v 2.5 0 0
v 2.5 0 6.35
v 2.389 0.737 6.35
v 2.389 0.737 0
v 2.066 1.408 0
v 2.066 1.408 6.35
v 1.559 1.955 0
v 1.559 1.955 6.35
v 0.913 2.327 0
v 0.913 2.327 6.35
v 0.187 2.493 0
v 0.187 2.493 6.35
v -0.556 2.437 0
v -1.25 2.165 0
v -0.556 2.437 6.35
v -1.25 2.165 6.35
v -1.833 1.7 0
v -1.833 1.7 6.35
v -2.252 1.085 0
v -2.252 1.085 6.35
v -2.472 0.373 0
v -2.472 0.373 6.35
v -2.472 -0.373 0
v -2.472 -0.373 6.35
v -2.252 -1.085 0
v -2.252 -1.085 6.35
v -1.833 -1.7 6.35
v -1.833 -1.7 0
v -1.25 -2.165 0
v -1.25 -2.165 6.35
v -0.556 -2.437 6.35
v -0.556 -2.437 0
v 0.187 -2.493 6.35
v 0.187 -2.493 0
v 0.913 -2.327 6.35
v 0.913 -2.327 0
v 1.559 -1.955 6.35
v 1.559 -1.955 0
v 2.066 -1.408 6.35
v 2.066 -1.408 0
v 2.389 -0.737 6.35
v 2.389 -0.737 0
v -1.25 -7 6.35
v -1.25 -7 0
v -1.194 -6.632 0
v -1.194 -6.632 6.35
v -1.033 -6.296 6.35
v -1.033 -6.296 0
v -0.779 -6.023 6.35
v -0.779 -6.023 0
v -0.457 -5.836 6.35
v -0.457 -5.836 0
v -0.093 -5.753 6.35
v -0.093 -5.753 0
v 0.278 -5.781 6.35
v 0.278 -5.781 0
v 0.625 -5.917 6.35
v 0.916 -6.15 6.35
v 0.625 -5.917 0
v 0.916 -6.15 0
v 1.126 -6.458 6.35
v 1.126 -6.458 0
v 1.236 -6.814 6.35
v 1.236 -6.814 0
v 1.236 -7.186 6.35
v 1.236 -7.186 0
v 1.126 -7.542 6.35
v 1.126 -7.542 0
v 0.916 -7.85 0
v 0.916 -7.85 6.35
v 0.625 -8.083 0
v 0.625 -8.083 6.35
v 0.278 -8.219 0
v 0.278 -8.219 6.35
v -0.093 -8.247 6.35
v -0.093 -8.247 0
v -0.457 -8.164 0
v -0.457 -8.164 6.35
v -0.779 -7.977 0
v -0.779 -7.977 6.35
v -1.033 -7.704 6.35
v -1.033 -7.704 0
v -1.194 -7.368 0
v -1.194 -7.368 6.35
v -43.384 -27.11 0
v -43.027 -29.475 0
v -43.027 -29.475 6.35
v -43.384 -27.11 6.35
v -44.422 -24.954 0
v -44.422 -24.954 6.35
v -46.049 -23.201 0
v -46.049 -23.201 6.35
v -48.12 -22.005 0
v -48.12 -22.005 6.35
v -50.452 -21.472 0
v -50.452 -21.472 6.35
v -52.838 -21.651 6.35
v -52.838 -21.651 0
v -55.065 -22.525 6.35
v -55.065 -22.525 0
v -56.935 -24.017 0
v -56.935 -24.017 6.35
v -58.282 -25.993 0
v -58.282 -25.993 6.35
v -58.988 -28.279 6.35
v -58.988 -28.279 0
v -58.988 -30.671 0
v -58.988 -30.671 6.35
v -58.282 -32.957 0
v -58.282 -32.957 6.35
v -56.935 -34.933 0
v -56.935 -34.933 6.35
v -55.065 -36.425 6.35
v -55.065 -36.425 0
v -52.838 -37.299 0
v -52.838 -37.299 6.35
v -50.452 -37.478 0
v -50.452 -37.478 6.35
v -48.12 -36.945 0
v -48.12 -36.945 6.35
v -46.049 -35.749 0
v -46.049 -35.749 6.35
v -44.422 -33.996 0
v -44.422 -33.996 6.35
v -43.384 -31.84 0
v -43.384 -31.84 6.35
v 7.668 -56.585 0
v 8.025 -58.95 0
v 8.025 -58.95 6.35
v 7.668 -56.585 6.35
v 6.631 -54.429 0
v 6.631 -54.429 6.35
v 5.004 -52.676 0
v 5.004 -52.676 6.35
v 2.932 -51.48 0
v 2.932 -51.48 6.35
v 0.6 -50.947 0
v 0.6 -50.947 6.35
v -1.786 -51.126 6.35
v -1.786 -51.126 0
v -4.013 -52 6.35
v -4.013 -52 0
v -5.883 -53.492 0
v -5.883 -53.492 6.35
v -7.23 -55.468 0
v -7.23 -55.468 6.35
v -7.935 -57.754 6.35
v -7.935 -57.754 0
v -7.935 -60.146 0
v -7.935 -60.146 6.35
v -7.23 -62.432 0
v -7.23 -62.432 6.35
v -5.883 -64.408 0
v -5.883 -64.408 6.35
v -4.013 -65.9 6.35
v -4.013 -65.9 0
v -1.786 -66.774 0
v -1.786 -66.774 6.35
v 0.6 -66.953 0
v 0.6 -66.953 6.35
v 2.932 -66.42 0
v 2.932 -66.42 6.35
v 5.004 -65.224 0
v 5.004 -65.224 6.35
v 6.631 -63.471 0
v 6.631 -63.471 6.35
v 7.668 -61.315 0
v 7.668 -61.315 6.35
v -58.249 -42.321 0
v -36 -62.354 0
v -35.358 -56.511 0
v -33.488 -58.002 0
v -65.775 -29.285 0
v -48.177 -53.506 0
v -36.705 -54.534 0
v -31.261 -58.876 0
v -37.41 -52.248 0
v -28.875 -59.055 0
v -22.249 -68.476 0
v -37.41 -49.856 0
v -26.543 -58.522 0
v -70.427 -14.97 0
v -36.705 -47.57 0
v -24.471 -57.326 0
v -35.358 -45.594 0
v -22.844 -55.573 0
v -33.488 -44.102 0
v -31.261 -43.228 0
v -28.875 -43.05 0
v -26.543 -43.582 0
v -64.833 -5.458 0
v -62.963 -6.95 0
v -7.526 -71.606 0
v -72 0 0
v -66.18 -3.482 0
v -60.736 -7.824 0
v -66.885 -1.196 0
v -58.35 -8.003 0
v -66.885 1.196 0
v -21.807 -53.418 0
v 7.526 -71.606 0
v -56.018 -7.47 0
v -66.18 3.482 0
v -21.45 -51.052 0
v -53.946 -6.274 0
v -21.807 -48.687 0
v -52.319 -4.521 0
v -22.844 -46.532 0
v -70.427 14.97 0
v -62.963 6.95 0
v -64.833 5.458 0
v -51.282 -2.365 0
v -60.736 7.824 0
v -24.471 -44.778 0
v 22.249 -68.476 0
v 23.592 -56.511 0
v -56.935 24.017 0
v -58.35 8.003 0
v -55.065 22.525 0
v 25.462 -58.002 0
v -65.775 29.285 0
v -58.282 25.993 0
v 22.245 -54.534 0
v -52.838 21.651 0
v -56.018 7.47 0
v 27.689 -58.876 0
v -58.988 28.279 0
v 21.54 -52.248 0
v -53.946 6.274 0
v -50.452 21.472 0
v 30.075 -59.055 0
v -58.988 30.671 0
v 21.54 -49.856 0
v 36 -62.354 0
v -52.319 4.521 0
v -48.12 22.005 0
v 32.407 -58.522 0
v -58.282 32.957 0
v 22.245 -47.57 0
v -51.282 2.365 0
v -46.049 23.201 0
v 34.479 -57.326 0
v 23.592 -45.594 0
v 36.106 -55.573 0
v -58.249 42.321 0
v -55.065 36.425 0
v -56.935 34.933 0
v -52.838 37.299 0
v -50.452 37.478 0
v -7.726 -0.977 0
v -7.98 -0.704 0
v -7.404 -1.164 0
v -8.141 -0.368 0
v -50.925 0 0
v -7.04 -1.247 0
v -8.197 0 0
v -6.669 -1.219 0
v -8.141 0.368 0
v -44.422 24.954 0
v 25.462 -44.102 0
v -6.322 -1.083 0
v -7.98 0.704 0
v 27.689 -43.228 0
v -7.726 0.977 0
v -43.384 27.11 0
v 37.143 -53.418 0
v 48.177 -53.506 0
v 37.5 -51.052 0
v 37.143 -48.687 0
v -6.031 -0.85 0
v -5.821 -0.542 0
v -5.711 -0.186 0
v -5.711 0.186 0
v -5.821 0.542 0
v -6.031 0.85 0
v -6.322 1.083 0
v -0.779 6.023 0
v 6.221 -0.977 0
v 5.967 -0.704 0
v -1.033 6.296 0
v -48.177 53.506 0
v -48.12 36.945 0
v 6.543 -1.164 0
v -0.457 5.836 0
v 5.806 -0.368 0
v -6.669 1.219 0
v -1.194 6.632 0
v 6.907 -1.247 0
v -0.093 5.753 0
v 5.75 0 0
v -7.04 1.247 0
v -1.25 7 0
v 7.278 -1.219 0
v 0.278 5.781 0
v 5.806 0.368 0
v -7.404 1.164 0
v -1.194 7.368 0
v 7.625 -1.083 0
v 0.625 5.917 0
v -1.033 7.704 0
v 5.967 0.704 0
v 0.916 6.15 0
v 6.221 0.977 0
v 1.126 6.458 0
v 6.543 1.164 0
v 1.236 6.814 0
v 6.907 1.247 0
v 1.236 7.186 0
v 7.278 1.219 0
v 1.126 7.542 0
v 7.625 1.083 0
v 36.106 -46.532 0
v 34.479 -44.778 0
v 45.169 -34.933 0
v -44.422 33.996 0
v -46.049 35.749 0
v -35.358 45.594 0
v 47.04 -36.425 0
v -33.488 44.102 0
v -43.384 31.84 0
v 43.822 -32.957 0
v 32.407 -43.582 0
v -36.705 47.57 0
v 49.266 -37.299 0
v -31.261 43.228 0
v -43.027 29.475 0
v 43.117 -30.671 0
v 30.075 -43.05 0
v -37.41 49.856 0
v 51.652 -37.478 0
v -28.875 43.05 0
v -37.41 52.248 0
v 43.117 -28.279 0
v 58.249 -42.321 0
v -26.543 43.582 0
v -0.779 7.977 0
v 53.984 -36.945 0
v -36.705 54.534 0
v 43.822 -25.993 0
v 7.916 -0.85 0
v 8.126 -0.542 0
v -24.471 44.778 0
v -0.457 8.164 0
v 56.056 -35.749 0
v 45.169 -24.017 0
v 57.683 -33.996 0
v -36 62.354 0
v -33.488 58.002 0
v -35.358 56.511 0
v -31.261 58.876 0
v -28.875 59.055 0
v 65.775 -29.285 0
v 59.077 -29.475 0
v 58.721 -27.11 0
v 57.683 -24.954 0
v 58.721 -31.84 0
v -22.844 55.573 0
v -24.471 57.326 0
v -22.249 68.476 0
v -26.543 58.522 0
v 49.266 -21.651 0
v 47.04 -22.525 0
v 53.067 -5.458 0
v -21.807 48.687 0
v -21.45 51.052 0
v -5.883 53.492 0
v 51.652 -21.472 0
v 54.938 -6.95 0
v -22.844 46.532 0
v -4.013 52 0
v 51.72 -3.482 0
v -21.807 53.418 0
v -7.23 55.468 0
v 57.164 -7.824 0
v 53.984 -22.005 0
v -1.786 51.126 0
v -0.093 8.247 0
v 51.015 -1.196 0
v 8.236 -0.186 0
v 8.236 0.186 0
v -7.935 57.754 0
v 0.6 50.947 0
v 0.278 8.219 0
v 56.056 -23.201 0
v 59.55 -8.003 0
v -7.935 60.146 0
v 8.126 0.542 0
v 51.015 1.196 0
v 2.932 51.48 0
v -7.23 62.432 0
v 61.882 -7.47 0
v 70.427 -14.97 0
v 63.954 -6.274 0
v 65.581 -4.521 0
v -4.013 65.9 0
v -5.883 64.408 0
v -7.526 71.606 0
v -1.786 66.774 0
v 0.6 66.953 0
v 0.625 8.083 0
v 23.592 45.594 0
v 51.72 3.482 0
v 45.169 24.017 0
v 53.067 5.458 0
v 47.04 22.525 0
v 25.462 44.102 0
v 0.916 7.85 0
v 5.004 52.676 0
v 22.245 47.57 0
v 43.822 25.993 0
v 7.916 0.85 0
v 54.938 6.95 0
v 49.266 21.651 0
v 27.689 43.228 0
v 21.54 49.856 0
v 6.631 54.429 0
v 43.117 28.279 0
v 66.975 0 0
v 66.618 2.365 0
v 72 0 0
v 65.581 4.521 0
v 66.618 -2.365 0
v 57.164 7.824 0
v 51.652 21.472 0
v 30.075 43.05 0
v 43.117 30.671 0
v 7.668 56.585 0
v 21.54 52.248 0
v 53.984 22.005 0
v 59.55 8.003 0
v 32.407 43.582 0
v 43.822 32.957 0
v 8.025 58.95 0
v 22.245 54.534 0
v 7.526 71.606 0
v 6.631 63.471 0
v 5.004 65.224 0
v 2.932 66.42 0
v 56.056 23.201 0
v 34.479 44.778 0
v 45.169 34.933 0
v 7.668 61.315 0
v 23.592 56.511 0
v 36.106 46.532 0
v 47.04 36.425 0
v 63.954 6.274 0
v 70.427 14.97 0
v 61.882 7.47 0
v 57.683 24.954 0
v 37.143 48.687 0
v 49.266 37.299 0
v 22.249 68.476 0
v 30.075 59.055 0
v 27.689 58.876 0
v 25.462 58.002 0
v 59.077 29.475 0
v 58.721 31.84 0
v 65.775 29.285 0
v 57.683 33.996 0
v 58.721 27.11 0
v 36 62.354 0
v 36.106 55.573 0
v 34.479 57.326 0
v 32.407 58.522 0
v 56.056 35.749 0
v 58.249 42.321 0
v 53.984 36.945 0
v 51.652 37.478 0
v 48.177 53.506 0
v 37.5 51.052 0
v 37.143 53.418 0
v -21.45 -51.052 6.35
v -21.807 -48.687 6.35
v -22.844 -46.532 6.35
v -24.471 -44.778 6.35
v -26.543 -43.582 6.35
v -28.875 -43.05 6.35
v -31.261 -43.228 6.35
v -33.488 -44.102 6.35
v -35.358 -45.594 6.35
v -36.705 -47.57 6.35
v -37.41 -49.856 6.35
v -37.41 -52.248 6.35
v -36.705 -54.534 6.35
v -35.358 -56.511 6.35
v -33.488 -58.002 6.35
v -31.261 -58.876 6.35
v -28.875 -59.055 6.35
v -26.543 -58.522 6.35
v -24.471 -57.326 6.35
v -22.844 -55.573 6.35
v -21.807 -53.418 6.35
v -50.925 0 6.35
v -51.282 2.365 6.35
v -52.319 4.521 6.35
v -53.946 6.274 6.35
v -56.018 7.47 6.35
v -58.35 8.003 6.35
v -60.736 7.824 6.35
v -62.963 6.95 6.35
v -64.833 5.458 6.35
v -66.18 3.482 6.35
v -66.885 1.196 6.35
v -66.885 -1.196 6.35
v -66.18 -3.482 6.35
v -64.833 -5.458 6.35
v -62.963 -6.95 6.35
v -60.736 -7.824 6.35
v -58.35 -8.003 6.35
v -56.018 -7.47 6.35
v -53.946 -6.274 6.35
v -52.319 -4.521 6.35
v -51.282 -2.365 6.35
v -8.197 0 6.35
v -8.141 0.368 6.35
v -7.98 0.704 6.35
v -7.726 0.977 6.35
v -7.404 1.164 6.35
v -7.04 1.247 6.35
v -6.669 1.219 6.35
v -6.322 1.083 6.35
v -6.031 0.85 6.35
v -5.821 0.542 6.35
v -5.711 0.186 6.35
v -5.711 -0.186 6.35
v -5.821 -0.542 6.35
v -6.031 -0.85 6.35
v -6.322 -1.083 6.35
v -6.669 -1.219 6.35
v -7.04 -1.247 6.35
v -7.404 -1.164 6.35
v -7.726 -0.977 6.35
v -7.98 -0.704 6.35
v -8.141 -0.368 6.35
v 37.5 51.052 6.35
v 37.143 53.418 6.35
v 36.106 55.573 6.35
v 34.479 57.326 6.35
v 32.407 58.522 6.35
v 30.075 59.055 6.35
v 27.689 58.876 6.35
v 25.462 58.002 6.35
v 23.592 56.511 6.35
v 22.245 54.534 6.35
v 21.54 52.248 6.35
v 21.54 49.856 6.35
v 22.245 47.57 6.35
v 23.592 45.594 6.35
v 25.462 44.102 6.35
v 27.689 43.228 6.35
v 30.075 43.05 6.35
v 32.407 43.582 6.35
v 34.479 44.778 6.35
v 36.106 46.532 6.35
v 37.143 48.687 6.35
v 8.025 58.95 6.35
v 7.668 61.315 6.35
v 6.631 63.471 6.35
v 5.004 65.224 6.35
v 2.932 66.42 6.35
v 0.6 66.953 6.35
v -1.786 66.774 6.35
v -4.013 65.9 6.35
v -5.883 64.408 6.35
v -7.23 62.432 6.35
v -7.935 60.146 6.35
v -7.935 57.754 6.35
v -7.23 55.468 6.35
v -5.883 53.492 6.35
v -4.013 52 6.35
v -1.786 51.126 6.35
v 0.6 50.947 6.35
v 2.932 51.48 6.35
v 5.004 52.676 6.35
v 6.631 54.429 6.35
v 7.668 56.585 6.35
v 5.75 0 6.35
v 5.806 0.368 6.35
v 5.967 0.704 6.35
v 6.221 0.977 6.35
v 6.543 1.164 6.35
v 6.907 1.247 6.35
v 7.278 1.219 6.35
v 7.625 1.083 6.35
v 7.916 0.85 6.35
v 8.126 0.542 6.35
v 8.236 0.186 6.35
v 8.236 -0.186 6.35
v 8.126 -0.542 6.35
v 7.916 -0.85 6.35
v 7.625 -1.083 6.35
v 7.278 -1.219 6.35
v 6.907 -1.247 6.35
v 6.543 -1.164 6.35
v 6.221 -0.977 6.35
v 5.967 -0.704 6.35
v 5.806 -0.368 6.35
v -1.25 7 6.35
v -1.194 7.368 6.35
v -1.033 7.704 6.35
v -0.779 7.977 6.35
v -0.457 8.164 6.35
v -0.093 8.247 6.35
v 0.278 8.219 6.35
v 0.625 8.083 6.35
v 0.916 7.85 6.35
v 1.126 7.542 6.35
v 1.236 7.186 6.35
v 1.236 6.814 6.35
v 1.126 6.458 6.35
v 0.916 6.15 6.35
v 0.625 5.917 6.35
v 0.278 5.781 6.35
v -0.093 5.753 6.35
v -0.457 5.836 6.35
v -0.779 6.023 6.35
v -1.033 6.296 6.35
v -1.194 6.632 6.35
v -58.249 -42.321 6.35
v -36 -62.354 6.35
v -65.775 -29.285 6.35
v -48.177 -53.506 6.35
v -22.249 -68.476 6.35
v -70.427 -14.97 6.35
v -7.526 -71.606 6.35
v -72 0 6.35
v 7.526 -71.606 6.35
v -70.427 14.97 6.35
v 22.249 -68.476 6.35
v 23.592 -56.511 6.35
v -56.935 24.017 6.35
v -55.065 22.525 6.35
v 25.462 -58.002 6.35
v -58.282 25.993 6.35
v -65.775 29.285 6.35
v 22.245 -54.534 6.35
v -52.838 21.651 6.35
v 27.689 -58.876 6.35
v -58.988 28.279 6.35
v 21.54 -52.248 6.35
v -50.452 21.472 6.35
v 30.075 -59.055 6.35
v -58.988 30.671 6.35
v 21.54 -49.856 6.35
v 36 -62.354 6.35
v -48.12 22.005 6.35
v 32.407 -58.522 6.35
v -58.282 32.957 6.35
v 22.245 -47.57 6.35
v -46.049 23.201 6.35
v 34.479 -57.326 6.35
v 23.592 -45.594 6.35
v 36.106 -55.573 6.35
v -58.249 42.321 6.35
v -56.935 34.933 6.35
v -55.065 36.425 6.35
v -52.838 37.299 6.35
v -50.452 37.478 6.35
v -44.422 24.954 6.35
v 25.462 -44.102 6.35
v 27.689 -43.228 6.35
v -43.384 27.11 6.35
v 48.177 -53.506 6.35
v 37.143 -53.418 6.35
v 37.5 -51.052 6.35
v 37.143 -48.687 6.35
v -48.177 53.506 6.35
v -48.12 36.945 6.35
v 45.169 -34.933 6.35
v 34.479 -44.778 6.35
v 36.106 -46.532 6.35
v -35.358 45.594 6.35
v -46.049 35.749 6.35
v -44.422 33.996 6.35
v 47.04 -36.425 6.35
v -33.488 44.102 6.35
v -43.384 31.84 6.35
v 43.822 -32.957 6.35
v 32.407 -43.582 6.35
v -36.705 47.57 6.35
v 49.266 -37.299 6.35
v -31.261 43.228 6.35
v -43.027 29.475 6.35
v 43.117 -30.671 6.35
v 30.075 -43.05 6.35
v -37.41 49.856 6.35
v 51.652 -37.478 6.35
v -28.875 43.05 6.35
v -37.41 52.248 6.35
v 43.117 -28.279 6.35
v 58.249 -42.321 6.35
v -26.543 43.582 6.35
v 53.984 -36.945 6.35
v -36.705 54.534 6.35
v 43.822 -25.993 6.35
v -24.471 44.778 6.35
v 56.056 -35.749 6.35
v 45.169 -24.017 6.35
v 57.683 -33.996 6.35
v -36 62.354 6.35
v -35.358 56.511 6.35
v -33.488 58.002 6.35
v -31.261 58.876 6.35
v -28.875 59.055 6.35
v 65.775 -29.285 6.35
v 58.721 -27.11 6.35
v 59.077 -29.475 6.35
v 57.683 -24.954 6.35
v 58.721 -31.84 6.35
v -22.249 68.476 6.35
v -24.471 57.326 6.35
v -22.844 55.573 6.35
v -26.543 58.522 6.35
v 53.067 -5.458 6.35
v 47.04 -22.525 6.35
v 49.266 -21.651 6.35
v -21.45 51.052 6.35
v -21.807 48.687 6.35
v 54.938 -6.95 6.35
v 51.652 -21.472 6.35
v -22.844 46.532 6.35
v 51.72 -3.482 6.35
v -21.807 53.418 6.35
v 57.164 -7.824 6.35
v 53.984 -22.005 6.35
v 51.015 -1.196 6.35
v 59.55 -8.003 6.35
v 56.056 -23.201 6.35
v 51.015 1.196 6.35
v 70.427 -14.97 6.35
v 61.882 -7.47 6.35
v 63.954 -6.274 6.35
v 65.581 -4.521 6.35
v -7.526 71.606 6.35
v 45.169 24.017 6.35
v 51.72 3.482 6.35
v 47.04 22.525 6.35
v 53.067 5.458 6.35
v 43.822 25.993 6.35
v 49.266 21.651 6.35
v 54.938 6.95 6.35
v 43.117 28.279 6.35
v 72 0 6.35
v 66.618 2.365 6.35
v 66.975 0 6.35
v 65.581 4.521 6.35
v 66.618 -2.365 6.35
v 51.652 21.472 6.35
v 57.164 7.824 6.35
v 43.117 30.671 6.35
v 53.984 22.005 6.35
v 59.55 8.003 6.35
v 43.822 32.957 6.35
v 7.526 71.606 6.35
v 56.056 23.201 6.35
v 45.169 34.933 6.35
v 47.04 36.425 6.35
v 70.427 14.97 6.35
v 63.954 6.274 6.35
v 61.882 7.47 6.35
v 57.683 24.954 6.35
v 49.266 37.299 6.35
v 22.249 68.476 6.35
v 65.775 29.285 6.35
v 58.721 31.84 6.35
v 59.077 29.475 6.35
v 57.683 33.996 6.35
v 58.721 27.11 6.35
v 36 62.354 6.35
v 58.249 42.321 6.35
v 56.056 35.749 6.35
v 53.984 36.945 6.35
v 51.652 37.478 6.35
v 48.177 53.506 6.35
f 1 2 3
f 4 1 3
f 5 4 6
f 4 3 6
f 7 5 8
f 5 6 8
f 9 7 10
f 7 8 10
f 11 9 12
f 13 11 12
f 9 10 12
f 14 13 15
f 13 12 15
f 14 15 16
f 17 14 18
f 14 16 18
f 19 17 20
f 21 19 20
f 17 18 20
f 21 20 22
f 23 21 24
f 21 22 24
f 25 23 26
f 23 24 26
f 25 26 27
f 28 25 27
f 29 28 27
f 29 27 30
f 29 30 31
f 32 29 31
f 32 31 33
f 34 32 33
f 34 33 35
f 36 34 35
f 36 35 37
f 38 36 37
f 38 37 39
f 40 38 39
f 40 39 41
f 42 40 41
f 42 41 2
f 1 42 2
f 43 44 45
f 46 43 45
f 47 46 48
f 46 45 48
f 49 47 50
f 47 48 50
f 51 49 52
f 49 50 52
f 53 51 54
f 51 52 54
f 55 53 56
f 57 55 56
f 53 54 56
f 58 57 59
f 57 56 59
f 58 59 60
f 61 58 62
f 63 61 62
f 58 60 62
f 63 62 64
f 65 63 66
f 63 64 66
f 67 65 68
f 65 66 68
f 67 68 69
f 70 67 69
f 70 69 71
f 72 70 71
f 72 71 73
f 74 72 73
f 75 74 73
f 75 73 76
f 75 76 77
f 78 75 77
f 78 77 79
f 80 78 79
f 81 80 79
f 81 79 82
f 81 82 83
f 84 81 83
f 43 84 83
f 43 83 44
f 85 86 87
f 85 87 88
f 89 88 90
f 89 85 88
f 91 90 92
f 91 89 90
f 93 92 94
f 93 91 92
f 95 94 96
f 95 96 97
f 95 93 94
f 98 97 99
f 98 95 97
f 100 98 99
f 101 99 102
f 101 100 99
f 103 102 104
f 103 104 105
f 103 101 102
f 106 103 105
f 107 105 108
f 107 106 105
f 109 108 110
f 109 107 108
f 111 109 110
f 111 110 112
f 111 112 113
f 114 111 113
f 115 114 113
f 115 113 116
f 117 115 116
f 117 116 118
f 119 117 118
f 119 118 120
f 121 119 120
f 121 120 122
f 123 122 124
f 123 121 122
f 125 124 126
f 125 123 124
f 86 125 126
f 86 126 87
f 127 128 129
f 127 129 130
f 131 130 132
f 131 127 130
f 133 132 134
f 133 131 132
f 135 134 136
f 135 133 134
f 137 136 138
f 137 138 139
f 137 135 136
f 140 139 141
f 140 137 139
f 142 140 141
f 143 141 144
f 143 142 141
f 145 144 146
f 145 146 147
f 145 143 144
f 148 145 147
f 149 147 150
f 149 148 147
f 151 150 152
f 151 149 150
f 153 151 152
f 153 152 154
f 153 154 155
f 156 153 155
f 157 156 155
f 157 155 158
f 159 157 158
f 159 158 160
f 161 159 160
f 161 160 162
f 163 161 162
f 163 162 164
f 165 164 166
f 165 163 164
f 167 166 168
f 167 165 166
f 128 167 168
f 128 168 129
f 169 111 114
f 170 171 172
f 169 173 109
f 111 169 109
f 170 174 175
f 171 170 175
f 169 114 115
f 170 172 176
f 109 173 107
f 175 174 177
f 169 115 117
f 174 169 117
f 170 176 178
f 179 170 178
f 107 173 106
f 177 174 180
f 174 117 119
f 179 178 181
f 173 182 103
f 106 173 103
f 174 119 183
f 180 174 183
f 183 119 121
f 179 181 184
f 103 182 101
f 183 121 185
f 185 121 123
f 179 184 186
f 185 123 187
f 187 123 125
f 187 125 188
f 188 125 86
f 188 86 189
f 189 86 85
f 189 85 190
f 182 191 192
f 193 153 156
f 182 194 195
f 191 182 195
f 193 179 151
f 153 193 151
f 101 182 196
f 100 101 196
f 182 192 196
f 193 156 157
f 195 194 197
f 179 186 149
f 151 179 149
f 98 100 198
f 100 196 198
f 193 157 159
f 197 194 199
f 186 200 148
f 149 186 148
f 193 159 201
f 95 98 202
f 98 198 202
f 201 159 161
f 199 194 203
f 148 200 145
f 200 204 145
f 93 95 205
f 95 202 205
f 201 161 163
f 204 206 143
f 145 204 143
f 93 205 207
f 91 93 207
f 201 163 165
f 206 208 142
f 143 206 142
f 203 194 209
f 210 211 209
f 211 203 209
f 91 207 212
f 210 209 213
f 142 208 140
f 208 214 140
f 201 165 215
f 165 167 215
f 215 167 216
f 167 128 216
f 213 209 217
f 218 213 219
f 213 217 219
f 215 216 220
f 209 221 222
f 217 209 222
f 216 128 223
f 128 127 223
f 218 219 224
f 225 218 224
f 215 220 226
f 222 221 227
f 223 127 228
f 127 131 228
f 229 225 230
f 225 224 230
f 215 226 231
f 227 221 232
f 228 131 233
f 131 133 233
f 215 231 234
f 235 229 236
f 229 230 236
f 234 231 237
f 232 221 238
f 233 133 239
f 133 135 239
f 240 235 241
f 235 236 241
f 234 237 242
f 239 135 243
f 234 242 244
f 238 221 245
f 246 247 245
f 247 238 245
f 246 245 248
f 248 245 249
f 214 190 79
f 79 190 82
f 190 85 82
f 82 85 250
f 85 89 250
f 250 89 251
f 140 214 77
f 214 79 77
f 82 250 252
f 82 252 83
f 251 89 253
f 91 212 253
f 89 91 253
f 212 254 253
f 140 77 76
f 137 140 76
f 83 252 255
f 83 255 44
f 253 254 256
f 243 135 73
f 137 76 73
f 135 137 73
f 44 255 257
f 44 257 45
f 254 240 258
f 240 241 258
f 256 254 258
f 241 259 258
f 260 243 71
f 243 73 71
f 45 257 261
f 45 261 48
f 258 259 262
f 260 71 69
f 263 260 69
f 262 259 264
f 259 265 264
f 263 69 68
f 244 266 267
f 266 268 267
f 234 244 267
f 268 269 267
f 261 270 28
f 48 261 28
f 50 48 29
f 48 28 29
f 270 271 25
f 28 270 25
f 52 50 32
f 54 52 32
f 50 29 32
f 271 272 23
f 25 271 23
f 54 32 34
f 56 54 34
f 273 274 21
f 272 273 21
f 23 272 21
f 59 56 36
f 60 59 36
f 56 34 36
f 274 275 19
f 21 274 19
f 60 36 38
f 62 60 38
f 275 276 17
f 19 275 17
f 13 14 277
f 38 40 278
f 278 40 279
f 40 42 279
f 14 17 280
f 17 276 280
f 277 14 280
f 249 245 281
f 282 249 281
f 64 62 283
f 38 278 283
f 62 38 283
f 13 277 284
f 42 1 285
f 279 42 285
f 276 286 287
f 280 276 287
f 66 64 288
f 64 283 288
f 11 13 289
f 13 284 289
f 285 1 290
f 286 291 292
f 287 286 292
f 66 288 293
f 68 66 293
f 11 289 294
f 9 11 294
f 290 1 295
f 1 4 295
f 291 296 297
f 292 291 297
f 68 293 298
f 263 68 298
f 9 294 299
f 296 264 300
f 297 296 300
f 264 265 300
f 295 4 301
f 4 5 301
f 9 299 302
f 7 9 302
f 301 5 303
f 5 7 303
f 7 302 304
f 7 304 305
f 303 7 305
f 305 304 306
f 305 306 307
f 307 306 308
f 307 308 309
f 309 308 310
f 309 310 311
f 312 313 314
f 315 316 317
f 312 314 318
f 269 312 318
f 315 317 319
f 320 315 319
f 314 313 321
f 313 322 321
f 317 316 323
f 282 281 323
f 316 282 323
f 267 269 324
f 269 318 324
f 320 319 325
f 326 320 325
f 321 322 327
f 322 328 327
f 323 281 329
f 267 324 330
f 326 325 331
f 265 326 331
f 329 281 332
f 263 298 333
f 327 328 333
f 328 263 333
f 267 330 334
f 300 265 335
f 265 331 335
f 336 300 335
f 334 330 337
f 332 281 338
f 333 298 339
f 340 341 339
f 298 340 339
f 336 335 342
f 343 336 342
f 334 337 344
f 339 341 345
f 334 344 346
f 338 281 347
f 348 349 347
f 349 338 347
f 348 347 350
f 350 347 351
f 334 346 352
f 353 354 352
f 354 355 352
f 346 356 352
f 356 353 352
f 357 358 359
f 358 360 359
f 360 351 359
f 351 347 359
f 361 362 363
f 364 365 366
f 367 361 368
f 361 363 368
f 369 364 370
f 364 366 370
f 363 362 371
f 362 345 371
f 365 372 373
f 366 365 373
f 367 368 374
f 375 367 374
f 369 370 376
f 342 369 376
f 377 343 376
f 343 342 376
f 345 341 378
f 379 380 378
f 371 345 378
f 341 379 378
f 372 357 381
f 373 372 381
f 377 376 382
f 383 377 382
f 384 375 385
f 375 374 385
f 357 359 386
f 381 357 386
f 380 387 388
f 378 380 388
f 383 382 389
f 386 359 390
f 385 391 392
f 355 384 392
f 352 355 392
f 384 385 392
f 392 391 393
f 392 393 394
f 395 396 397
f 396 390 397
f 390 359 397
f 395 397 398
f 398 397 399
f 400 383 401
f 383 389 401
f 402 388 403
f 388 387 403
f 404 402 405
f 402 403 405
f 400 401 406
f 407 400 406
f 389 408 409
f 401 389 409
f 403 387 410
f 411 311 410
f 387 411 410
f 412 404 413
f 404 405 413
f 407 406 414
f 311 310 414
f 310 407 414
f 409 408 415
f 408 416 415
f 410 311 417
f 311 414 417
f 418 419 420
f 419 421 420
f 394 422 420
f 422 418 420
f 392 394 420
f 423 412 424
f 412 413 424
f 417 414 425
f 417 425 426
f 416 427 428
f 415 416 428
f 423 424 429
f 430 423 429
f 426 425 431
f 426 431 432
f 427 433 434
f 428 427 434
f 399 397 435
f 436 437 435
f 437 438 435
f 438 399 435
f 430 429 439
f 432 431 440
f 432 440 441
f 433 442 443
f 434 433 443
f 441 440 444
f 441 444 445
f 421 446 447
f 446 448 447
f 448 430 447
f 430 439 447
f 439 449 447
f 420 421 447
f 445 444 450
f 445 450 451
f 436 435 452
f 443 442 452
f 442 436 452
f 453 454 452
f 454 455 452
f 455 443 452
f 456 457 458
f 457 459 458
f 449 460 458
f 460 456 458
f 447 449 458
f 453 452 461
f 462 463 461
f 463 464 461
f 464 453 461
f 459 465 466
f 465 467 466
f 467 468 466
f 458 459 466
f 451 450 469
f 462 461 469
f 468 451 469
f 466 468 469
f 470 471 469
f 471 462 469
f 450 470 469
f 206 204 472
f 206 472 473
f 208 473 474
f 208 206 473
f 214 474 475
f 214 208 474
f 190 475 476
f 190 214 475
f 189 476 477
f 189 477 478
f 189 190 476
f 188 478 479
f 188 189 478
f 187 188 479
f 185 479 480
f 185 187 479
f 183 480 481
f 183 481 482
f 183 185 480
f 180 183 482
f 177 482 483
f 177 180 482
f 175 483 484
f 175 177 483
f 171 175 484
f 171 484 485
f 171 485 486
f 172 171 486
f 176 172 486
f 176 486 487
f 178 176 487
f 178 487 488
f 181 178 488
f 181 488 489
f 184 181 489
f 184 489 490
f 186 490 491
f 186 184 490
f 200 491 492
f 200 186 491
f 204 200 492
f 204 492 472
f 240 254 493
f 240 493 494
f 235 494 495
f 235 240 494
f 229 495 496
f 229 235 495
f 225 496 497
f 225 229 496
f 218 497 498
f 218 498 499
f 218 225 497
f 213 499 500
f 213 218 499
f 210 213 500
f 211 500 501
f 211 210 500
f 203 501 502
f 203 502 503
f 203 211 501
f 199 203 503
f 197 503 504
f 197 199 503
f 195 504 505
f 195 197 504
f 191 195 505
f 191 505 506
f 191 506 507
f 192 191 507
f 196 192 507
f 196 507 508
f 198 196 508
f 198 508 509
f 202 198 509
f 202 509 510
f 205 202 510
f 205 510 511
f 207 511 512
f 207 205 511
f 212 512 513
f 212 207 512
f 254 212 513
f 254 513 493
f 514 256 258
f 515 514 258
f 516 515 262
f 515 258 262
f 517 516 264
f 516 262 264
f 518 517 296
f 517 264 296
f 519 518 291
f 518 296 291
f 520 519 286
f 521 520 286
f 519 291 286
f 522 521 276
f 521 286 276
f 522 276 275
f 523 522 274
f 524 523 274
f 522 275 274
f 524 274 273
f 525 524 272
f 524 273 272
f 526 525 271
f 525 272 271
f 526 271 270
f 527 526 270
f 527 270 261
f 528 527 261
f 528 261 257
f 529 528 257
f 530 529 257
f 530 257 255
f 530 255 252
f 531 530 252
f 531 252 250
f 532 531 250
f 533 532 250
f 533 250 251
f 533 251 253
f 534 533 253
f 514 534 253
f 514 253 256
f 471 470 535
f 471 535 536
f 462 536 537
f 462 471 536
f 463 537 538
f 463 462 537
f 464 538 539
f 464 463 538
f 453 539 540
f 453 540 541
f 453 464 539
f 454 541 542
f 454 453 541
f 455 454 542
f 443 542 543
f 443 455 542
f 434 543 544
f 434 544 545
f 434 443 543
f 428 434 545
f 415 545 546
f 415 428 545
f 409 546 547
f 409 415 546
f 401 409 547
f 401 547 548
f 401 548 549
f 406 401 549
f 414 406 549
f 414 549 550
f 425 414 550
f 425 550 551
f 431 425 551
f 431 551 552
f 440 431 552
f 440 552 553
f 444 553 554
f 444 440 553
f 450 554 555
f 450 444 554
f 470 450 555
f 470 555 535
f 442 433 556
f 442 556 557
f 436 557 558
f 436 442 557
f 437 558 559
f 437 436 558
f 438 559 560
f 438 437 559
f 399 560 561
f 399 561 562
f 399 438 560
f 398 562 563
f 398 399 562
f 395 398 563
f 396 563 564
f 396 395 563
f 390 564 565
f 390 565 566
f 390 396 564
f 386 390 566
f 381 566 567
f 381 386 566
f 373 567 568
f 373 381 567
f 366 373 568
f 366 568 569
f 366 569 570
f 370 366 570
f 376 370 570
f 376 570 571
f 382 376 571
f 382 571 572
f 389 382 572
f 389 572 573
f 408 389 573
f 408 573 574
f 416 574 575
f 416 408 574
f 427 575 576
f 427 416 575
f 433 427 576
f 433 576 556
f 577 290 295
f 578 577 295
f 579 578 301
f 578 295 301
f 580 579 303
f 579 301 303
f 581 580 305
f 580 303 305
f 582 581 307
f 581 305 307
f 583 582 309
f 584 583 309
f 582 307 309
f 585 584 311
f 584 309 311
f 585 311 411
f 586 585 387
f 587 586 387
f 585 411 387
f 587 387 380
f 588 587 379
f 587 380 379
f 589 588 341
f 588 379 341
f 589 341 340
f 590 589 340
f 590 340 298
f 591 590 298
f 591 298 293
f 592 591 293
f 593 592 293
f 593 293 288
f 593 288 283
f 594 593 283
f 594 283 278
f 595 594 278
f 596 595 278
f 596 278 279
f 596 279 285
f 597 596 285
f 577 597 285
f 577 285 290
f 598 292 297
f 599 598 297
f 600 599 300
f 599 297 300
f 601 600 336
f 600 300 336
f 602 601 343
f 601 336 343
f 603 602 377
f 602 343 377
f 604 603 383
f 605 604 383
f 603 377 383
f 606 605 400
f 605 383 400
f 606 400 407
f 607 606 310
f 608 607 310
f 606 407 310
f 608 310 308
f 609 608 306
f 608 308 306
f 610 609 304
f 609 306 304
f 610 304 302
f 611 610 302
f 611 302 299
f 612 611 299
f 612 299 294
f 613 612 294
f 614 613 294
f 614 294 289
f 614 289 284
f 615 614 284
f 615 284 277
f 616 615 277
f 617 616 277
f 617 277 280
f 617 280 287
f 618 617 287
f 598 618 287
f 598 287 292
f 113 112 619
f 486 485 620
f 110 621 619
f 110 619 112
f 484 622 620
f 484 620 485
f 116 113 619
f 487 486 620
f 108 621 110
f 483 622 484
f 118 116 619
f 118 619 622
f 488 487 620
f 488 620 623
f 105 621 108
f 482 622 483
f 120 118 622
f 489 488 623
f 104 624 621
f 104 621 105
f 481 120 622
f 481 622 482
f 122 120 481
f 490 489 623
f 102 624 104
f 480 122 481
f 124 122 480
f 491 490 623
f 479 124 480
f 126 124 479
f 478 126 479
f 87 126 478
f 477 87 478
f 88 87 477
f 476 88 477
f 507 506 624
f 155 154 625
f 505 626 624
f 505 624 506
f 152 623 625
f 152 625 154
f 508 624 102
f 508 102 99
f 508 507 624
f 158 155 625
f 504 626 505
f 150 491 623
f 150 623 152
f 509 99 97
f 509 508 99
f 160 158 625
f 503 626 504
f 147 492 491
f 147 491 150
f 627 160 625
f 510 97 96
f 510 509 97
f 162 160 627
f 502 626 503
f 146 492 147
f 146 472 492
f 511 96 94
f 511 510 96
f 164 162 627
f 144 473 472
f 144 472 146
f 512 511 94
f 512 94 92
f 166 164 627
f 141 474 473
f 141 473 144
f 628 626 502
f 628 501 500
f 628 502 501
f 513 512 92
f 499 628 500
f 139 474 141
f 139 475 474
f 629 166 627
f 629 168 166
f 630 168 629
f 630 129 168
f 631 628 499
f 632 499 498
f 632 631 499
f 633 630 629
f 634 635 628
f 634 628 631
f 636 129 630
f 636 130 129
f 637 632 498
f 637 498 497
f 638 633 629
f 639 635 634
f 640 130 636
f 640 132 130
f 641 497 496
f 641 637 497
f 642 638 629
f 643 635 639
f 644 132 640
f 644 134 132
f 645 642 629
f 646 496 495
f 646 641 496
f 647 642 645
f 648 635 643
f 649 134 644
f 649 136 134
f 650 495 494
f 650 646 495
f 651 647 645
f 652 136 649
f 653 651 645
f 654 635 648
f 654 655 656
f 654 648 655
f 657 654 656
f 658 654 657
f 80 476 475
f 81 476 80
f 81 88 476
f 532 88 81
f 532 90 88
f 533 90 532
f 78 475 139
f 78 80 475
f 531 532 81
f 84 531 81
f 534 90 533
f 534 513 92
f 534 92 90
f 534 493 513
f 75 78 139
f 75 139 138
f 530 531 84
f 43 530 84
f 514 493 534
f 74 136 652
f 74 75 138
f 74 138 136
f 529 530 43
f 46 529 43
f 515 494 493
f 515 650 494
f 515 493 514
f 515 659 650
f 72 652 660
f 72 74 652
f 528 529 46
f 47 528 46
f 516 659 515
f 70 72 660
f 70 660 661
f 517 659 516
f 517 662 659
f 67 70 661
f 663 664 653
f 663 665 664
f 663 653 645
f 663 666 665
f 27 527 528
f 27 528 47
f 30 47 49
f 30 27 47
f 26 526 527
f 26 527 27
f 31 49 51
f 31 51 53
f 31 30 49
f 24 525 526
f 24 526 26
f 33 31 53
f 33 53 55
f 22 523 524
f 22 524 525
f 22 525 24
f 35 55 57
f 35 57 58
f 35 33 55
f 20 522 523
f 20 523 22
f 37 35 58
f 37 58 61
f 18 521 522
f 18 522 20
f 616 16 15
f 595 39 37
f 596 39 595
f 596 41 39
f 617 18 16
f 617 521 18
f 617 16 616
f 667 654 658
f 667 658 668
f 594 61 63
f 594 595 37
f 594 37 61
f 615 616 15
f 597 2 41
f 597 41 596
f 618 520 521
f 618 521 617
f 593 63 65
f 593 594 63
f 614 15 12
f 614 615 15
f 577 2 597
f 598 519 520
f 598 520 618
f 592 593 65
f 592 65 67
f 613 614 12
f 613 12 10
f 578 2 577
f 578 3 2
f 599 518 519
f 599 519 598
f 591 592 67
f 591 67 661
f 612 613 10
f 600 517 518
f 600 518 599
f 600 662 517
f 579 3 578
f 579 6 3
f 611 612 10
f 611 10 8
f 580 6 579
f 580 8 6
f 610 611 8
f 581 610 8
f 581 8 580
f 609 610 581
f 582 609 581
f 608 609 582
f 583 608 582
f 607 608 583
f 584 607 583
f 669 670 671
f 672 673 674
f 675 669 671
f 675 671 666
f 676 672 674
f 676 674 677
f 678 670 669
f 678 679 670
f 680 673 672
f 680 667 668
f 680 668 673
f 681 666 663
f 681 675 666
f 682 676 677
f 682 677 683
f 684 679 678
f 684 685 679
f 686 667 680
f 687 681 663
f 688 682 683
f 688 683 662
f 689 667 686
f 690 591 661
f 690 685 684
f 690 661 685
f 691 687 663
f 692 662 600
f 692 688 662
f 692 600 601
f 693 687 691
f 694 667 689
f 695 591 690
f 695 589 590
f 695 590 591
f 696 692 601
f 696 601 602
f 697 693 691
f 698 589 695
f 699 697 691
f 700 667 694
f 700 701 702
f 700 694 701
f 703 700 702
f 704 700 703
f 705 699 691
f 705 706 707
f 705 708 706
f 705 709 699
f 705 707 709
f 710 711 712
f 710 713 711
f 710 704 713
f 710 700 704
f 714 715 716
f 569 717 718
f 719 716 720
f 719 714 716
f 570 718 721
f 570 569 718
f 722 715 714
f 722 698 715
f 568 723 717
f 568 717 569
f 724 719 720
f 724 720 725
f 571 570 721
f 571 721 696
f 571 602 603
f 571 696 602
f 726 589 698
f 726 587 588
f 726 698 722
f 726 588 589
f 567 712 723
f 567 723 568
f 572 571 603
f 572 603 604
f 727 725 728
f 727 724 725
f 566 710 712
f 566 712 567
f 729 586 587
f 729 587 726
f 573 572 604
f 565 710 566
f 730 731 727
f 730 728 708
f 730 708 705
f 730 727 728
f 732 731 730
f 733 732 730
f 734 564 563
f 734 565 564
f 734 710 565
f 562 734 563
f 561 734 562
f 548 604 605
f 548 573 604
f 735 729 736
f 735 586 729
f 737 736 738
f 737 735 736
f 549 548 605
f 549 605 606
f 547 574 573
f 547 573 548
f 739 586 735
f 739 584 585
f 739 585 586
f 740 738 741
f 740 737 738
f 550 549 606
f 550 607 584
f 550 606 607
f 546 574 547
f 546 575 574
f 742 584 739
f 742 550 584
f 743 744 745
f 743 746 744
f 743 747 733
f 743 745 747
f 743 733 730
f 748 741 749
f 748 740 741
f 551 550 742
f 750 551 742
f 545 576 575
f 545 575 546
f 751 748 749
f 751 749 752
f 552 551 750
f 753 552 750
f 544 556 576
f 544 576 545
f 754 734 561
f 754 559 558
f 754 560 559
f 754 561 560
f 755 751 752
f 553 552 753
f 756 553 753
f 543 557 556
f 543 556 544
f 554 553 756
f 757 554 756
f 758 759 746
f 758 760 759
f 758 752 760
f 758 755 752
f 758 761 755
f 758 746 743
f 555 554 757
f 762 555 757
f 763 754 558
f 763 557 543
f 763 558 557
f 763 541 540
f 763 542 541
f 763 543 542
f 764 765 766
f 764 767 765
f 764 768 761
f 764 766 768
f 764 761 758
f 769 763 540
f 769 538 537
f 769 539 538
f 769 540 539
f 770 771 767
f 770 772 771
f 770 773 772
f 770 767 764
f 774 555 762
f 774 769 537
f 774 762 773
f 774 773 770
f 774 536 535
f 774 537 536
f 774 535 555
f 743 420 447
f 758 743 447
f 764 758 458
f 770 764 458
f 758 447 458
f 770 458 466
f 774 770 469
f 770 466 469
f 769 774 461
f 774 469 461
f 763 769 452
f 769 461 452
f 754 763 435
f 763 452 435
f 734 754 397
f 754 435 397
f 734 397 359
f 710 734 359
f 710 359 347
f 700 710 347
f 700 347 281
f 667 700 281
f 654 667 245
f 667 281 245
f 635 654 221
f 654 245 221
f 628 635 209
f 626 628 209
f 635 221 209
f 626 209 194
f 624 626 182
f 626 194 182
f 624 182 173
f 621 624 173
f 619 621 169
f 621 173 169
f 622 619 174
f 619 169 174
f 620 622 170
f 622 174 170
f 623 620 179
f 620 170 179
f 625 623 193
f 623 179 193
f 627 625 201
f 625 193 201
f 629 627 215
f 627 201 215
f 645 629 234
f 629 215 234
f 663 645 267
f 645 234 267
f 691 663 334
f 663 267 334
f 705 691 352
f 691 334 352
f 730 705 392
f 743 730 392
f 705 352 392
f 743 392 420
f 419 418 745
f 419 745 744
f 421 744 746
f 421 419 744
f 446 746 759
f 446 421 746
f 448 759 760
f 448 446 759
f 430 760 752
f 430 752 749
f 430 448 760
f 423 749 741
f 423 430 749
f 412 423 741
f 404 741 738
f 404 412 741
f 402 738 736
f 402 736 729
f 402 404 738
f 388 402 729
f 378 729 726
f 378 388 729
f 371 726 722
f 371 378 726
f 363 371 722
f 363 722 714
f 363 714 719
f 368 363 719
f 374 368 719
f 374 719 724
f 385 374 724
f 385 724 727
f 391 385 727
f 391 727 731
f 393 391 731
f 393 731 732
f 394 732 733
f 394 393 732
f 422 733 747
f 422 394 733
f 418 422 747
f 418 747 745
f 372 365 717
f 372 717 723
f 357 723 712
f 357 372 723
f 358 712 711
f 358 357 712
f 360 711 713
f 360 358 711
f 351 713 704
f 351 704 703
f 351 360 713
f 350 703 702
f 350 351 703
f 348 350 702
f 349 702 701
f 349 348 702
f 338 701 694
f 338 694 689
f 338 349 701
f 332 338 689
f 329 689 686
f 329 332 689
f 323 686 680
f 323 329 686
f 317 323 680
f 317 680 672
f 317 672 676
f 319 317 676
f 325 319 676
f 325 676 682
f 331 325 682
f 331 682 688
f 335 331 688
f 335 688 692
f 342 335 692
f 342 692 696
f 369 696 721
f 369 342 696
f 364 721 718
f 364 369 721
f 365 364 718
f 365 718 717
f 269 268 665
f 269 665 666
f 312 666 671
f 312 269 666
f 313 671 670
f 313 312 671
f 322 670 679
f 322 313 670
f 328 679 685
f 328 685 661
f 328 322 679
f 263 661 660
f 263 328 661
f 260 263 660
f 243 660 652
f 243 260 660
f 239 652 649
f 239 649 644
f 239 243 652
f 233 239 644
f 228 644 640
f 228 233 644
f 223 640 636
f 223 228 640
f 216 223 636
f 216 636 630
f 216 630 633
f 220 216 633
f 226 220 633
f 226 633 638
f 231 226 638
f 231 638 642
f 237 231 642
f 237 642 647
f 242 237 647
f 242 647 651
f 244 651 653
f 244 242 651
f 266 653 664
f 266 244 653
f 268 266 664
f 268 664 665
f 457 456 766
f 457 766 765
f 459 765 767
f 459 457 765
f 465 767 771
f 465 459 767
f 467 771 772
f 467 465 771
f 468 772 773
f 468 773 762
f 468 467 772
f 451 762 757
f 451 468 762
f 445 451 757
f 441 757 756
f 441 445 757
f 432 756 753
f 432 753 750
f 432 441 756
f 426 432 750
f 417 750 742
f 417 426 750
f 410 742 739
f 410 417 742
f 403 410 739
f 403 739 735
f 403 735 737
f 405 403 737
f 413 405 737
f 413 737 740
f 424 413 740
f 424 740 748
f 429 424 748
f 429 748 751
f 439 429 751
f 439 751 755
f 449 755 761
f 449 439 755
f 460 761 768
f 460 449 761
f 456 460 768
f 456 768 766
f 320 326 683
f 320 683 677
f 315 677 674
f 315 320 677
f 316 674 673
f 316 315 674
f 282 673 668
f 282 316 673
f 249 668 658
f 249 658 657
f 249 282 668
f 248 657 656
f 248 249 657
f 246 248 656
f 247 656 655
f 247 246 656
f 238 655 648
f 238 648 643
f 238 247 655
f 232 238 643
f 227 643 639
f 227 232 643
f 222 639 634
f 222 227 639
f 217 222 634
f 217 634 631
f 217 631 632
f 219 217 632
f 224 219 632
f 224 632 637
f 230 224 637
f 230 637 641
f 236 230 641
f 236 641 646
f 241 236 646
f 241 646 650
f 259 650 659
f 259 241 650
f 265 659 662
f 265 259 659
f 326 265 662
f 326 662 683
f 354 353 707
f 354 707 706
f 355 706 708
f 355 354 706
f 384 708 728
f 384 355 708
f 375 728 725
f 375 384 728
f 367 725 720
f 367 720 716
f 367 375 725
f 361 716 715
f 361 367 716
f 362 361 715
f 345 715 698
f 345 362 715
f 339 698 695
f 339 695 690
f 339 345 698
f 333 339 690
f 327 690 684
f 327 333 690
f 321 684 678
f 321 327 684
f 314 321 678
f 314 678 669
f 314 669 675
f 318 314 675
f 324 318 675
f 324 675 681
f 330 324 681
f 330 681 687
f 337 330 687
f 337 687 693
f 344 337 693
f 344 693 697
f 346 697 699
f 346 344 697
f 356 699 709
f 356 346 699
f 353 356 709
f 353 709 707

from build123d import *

# Parameters (mm, degrees)
SKETCH1_R             = 72
SKETCH1_R_2           = 8.025
BOSS_EXTRUDE1_DEPTH   = 6.35
SKETCH2_R             = 2.5
CUT_EXTRUDE1_DEPTH    = 10
M3X0_5_TAPPED_HOLE1_D = 2.5
M3X0_5_TAPPED_HOLE2_D = 2.5
M3X0_5_TAPPED_HOLE3_D = 2.5
M3X0_5_TAPPED_HOLE4_D = 2.5


with BuildPart() as part:
    # Sketch1 → Boss-Extrude1 (new body)
    with BuildSketch(Plane.XY):
        Circle(SKETCH1_R)
        with Locations((58.95, 0)):
            Circle(SKETCH1_R_2, mode=Mode.SUBTRACT)
        with Locations((51.052197553, 29.475)):
            Circle(SKETCH1_R_2, mode=Mode.SUBTRACT)
        with Locations((29.475, 51.052197553)):
            Circle(SKETCH1_R_2, mode=Mode.SUBTRACT)
        with Locations((0, 58.95)):
            Circle(SKETCH1_R_2, mode=Mode.SUBTRACT)
        with Locations((-29.475, 51.052197553)):
            Circle(SKETCH1_R_2, mode=Mode.SUBTRACT)
        with Locations((-51.052197553, 29.475)):
            Circle(SKETCH1_R_2, mode=Mode.SUBTRACT)
        with Locations((-58.95, 0)):
            Circle(SKETCH1_R_2, mode=Mode.SUBTRACT)
        with Locations((-51.052197553, -29.475)):
            Circle(SKETCH1_R_2, mode=Mode.SUBTRACT)
        with Locations((-29.475, -51.052197553)):
            Circle(SKETCH1_R_2, mode=Mode.SUBTRACT)
        with Locations((0, -58.95)):
            Circle(SKETCH1_R_2, mode=Mode.SUBTRACT)
        with Locations((29.475, -51.052197553)):
            Circle(SKETCH1_R_2, mode=Mode.SUBTRACT)
        with Locations((51.052197553, -29.475)):
            Circle(SKETCH1_R_2, mode=Mode.SUBTRACT)
    extrude(amount=BOSS_EXTRUDE1_DEPTH)

    # Sketch2 → Cut-Extrude1 (cut)
    with BuildSketch(Plane.XY.offset(6.35)):
        Circle(SKETCH2_R)
    extrude(amount=-CUT_EXTRUDE1_DEPTH, mode=Mode.SUBTRACT)

    # M3x0.5 Tapped Hole1 (through all)
    with Locations(Plane(origin=(-6.94699298, 0, 6.35), x_dir=(1, 0, 0), z_dir=(0, 0, 1))):
        with Locations((0, 0)):
            Hole(M3X0_5_TAPPED_HOLE1_D / 2)

    # M3x0.5 Tapped Hole2 (through all)
    with Locations(Plane(origin=(0, 7, 6.35), x_dir=(1, 0, 0), z_dir=(0, 0, 1))):
        with Locations((0, 0)):
            Hole(M3X0_5_TAPPED_HOLE2_D / 2)

    # M3x0.5 Tapped Hole3 (through all)
    with Locations(Plane(origin=(0, -7, 6.35), x_dir=(1, 0, 0), z_dir=(0, 0, 1))):
        with Locations((0, 0)):
            Hole(M3X0_5_TAPPED_HOLE3_D / 2)

    # M3x0.5 Tapped Hole4 (through all)
    with Locations(Plane(origin=(7, 0, 6.35), x_dir=(1, 0, 0), z_dir=(0, 0, 1))):
        with Locations((0, 0)):
            Hole(M3X0_5_TAPPED_HOLE4_D / 2)


solid = part.part
